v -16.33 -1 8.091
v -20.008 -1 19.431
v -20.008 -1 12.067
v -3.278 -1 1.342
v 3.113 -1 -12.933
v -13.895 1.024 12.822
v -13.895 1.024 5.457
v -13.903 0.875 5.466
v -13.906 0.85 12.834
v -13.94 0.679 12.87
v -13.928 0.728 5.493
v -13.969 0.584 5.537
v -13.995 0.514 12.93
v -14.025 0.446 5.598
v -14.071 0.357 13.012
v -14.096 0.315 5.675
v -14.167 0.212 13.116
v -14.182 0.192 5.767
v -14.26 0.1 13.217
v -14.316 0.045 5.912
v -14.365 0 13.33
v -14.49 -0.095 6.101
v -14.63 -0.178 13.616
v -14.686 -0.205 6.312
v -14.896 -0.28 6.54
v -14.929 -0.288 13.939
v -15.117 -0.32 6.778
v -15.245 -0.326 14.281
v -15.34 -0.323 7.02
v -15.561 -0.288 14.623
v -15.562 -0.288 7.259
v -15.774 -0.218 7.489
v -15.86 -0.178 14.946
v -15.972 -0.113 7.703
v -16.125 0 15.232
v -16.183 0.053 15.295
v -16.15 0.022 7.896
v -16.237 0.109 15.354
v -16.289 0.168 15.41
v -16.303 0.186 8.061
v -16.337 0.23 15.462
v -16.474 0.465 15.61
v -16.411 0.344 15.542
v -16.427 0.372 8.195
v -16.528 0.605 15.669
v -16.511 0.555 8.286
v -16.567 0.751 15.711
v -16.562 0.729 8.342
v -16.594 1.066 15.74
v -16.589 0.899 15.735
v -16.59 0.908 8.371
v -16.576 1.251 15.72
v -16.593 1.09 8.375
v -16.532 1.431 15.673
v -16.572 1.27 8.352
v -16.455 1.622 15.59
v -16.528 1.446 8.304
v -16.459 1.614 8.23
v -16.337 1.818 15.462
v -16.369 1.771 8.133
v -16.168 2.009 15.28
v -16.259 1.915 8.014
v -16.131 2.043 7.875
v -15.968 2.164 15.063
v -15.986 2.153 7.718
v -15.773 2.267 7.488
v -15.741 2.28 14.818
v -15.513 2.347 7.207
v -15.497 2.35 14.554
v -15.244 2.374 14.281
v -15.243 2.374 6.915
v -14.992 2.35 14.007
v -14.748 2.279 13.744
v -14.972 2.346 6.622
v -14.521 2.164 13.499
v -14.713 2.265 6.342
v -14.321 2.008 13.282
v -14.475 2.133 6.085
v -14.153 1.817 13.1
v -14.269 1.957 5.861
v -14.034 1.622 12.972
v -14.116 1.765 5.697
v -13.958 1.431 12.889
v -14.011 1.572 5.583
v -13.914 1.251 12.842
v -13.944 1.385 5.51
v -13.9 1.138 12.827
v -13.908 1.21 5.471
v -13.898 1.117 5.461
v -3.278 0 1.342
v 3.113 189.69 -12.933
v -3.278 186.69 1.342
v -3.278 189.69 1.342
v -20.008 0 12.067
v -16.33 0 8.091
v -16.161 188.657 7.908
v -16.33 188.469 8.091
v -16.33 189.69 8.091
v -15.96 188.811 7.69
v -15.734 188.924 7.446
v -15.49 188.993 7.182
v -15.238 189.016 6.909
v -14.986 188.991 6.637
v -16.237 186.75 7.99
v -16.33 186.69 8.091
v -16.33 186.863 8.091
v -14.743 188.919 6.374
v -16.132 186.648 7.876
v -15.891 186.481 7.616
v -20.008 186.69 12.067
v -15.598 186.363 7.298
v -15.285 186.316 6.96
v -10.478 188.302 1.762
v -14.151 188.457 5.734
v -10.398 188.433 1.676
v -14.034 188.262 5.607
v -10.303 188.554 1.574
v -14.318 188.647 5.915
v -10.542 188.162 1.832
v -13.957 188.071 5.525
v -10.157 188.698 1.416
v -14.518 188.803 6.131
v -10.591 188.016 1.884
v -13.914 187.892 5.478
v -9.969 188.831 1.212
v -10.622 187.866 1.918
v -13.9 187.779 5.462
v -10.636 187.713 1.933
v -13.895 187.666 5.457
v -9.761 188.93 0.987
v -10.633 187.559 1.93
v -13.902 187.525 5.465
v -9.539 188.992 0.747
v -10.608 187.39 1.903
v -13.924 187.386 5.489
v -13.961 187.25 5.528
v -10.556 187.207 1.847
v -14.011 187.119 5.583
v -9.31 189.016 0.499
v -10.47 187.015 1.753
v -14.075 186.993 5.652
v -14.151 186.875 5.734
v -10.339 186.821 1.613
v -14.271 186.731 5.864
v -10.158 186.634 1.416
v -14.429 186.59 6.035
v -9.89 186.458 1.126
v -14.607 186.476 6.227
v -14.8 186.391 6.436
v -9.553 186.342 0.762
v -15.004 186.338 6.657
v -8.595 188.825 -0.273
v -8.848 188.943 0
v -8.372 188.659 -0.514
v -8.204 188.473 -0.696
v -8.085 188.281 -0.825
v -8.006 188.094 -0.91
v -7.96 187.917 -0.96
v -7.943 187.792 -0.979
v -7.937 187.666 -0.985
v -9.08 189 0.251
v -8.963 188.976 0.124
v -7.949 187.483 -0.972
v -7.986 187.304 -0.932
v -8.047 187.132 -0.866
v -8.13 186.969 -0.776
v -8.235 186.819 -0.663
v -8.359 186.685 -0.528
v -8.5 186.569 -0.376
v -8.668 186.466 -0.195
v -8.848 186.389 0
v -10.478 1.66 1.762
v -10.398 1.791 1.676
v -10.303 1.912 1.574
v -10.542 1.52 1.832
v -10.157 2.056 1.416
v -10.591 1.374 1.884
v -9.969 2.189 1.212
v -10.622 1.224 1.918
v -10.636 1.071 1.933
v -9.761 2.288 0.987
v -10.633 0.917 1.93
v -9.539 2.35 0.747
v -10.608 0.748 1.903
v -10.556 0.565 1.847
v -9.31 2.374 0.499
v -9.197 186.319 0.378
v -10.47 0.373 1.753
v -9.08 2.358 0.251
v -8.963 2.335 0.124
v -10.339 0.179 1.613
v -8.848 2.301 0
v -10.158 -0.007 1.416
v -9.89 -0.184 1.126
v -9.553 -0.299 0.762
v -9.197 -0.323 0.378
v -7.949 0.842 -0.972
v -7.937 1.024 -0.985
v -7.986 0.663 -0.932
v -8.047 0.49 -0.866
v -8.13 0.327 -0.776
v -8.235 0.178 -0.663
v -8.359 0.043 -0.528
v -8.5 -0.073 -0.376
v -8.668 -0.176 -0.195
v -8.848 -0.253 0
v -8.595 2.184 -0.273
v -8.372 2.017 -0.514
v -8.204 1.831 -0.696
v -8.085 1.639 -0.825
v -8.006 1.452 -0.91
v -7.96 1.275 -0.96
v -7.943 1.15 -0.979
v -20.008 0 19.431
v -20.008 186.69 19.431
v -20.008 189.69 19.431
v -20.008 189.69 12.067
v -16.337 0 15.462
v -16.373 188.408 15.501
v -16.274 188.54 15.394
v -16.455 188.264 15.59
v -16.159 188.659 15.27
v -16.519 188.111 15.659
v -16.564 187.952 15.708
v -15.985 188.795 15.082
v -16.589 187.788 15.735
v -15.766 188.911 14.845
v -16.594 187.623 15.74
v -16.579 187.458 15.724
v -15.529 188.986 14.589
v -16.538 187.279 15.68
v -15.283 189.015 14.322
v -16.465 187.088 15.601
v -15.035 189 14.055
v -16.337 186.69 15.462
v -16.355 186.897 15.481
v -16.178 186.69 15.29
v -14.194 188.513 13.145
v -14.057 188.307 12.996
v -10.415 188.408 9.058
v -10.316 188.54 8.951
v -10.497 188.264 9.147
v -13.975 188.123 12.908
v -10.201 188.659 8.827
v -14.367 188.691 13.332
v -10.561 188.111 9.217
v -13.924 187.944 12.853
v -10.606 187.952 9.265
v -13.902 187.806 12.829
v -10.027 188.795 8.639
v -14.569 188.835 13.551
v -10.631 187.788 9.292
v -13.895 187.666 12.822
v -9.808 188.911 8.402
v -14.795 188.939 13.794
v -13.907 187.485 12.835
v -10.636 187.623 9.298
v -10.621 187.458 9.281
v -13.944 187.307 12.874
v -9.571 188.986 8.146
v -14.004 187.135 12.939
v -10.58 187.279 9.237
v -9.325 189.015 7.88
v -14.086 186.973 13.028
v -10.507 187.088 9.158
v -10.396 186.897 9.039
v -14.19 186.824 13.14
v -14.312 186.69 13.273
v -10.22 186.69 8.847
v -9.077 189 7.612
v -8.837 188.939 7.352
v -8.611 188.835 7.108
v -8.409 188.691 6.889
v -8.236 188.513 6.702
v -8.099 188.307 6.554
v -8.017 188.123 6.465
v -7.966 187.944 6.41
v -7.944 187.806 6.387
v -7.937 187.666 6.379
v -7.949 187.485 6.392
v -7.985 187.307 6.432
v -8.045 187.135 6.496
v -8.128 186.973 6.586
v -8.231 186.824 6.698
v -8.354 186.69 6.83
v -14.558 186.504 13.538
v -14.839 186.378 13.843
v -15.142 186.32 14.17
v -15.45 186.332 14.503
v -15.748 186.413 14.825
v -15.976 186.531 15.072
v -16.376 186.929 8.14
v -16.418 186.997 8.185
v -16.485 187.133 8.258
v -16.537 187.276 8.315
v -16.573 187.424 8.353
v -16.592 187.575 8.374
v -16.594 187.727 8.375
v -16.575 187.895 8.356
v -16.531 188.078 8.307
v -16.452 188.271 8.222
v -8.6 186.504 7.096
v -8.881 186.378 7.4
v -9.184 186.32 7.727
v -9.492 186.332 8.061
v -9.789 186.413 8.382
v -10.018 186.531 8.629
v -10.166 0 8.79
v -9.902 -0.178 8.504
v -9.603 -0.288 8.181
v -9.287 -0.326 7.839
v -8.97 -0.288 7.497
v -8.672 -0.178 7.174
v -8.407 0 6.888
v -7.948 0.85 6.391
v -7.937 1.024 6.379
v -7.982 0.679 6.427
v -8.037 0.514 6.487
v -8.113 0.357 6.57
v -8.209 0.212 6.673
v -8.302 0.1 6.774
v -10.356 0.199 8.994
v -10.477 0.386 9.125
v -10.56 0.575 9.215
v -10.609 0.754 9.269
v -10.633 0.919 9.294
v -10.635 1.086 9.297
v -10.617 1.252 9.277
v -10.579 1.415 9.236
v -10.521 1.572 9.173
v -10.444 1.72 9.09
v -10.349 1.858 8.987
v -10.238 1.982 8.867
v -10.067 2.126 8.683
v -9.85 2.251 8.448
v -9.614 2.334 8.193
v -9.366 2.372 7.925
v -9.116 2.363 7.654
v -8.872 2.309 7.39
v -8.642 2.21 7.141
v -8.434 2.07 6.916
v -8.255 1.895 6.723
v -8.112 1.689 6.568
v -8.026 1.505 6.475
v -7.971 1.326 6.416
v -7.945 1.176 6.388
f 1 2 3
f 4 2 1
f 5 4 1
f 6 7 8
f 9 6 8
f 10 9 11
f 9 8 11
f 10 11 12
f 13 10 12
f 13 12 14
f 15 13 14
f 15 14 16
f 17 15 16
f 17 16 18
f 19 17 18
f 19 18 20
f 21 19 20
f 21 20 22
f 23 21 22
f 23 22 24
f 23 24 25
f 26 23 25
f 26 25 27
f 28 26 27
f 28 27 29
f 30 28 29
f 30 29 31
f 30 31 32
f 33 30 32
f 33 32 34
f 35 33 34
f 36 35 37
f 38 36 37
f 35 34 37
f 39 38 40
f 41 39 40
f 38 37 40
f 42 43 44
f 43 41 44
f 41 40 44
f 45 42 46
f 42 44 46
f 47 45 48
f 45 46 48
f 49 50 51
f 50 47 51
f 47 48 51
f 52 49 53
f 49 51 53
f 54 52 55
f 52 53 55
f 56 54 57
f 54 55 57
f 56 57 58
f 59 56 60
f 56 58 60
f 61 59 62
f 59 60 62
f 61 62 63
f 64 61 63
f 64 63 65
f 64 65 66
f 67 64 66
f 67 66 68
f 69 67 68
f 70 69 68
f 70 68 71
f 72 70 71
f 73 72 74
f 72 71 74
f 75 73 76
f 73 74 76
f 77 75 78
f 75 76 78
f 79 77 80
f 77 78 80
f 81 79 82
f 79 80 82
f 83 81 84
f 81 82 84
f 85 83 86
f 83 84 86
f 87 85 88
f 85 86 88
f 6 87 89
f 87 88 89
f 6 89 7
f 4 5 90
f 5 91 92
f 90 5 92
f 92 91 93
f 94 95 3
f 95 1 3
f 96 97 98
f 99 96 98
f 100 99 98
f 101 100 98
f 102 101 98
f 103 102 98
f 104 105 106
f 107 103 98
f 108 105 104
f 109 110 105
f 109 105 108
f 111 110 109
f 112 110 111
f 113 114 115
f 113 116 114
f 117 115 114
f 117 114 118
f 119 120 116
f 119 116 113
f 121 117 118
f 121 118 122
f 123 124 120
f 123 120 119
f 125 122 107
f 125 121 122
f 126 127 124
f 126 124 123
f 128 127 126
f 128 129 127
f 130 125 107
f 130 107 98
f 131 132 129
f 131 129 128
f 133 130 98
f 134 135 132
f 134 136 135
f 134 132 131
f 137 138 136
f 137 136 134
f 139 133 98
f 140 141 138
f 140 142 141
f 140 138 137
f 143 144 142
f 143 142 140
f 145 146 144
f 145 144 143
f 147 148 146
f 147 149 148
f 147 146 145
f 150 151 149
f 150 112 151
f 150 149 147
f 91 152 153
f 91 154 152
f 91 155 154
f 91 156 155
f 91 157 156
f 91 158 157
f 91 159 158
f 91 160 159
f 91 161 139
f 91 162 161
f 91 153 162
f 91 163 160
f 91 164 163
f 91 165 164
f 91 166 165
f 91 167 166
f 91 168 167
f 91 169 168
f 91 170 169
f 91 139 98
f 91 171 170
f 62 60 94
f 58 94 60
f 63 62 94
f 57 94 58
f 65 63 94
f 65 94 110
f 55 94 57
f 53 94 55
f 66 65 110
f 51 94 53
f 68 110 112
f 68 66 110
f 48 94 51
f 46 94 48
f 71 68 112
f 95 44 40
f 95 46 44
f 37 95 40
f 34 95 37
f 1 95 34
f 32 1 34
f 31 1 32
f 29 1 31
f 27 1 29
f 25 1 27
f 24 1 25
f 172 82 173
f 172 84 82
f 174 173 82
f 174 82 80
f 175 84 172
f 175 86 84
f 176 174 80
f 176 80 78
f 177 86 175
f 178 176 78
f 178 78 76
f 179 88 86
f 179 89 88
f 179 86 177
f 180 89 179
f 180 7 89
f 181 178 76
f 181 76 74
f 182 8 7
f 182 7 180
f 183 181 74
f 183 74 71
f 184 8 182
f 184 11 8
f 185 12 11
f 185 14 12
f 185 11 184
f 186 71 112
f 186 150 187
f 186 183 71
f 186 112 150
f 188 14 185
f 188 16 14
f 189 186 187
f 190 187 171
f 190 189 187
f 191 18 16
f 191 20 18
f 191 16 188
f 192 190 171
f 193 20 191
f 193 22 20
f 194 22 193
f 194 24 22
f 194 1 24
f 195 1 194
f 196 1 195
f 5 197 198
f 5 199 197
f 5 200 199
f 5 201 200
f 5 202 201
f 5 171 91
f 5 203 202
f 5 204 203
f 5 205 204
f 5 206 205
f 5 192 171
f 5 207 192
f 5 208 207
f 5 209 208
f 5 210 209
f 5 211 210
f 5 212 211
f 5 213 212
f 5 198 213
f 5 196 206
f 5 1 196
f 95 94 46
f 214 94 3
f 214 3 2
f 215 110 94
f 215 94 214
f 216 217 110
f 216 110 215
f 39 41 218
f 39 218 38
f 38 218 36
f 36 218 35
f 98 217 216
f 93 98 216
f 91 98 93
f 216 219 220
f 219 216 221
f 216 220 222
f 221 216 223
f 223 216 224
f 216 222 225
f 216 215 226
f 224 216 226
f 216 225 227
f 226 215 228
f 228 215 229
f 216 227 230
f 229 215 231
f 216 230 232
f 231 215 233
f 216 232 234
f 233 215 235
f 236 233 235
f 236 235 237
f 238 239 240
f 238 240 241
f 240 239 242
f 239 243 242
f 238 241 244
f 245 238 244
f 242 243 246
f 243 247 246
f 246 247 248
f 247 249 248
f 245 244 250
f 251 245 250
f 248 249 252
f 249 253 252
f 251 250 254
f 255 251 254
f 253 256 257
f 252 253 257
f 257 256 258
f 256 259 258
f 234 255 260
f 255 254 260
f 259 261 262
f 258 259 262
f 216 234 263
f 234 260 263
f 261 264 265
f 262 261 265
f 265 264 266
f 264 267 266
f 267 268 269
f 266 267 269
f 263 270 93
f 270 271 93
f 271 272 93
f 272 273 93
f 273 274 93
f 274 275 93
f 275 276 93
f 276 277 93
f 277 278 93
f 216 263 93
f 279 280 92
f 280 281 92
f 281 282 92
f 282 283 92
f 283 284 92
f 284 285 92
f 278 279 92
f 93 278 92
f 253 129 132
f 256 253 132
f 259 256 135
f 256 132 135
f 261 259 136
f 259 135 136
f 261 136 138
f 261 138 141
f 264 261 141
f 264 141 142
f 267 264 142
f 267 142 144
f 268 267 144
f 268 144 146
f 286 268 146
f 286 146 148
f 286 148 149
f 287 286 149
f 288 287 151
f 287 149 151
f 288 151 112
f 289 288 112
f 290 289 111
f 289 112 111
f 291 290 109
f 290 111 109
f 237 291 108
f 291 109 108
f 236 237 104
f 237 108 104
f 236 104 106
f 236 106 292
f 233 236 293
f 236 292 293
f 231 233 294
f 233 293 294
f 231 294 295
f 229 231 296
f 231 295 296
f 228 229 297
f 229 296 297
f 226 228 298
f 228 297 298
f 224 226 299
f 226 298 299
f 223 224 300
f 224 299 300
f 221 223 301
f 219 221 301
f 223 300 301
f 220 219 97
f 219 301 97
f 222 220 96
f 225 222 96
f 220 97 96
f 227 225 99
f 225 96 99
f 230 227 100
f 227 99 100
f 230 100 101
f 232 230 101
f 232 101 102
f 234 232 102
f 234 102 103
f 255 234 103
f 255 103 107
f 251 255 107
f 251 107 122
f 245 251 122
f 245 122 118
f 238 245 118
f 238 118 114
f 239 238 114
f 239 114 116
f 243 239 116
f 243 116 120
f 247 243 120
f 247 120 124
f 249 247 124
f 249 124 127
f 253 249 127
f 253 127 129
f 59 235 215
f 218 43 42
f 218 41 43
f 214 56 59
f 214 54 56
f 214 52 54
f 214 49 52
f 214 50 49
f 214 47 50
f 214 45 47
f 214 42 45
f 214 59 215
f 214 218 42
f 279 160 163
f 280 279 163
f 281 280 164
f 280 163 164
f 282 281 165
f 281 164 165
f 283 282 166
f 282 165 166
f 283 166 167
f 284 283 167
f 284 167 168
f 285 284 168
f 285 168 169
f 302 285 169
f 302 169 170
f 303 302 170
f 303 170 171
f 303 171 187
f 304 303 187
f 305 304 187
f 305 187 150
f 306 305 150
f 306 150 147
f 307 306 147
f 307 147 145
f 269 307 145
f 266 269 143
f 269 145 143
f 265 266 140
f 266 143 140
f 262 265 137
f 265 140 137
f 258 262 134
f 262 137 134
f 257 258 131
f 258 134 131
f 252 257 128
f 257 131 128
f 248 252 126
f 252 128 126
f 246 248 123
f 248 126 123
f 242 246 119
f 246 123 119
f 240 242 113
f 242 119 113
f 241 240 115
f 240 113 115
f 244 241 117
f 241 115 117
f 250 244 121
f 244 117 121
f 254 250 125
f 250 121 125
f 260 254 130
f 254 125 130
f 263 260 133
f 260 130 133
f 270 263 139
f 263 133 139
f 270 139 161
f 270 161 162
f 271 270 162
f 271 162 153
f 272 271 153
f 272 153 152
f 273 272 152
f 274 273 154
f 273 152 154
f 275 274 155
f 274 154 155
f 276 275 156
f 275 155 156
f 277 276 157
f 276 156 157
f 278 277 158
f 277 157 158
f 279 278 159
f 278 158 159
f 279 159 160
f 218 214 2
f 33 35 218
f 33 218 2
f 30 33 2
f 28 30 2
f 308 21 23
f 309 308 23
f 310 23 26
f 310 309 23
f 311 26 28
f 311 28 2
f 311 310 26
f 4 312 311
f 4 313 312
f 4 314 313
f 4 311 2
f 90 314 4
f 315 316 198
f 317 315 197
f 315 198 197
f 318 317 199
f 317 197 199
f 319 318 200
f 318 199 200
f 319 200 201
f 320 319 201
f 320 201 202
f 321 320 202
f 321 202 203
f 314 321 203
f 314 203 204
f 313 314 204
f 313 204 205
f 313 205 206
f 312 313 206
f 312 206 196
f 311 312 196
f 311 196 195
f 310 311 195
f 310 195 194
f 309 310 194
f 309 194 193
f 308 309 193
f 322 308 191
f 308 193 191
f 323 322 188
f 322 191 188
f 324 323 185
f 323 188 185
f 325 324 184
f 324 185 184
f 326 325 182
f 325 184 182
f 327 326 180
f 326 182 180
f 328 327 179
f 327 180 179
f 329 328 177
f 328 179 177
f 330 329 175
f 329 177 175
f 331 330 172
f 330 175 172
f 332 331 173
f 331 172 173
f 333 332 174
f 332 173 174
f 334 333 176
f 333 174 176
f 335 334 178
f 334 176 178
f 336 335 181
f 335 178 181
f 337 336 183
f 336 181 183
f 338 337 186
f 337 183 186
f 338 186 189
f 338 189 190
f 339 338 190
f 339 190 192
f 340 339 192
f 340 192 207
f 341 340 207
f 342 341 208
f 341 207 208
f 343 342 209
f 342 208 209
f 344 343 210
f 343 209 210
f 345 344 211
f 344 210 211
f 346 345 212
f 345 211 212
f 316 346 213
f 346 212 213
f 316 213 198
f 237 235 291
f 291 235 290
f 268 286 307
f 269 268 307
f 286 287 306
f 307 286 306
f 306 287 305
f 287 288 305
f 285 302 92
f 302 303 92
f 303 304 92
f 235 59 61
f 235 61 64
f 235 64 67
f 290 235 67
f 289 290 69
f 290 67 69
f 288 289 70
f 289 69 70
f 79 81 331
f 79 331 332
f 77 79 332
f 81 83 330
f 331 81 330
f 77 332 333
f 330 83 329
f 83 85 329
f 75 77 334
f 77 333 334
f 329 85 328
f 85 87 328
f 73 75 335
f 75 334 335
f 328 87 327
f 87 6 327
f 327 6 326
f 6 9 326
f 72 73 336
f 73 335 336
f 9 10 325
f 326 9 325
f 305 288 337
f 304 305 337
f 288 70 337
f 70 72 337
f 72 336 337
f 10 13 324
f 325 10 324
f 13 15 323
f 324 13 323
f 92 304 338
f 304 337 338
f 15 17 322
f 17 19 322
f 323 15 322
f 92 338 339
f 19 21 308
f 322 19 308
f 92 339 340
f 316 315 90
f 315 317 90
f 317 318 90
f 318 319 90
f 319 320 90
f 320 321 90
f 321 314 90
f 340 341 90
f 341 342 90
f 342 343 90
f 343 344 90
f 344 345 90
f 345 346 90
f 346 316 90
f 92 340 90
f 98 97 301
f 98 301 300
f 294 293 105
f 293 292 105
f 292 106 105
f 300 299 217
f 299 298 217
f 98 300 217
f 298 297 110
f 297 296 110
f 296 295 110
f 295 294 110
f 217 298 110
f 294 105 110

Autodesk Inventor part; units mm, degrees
ref_plane "YZ Plane" through (0, 0, 0) normal (1, 0, 0) x (0, 1, 0)
ref_plane "XZ Plane" through (0, 0, 0) normal (0, 1, 0) x (-1, 0, 0)
ref_plane "XY Plane" through (0, 0, 0) normal (0, 0, 1) x (1, 0, 0)
sketch "Sketch1" plane through (0, 0, 0) normal (0, 1, 0) x (-1, 0, 0)
  line L0 (20.0075, 12.0668) -> (-3.1128, -12.9332)
  line L1 (-3.1128, -12.9332) -> (20.0075, 12.0668)
  line L2 (-3.1128, -17.9332) -> (-3.1128, -12.9332)
  line L3 (-3.1128, -17.9332) -> (-14.7232, -17.9332)
  line L4 (-3.1128, -17.9332) -> (-3.1128, -12.9332)
  line L5 (-3.1128, -17.9332) -> (-8.918, -17.9332)
  arc A0 (-14.7232, -17.9332) -> (-3.1128, -12.9332) centre (-21.6099, 14.0384) ccw
  line L6 (-14.7232, -17.9332) -> (20.7671, -17.9332)
  line L7 (20.0075, 12.0668) -> (20.0075, -17.9332)
  line L8 (20.0075, 12.0668) -> (20.0075, 17.0668)
  line L9 (16.3366, 15.4617) -> (-8.1128, -10.9755)
  line L10 (16.3366, 15.4617) -> (20.0075, 19.431)
  line L11 (20.0075, 19.431) -> (20.0075, 15.7489)
  line L12 (-14.7232, -17.9332) -> (-8.1128, -10.9755)
  point P0 (0, 0)
  dimension "d0" = 5
  dimension "d1" = 5
extrude "Extrusion1" add sketch "Sketch1" along normal blind 186.69 contours L0 A0 L12 L9 L10 L11 L8
sketch "Sketch2" plane through (0, 0, 0) normal (0, -1, 0) x (1, 0, 0)
  line L0 (3.1128, -12.9332) -> (-20.0075, 12.0668) projected
  line L1 (-20.0075, 12.0668) -> (-16.3304, 12.0668)
  line L2 (-16.3304, 12.0668) -> (-16.3304, -0.4332)
  line L3 (-16.3304, -0.4332) -> (-20.0075, -0.4332)
  line L4 (-20.0075, -0.4332) -> (-20.0075, 12.0668)
  circle A0 centre (-18.1689, 1.5735) radius 1.35
  circle A1 centre (-18.1689, 5.8168) radius 1.35
  point P0 (0, 0)
  point P1 (-16.3304, 8.0908)
  dimension "d4" = 2.7
  dimension "d5" = 2.7
extrude "Extrusion2" add sketch "Sketch2" along normal blind 3 contours L2 L3 L4 L0
sketch "Sketch3" plane through (0, 0, 0) normal (0, -1, 0) x (1, 0, 0)
  line L0 (-20.0075, 12.0668) -> (-20.0075, 19.431) projected
  line L1 (3.1128, -12.9332) -> (-20.0075, 12.0668) projected
  line L2 (-20.0075, 19.431) -> (-20.0075, 12.0668)
  line L3 (-20.0075, 12.0668) -> (3.1128, -12.9332)
  arc A0 (3.1128, -12.9332) -> (14.7232, -17.9332) centre (21.6099, 14.0384) ccw projected
  arc A1 (3.1128, -12.9332) -> (14.6054, -17.9076) centre (21.6099, 14.0384) ccw
  line L4 (8.1128, -10.9755) -> (14.7232, -17.9332) projected
  line L5 (8.1128, -10.9755) -> (14.7232, -17.9332)
  line L6 (-20.0075, 19.431) -> (8.1128, -10.9755)
  point P0 (0, 0)
extrude "Extrusion3" add sketch "Sketch3" along normal blind 3
sketch "Sketch4" plane through (0, 186.69, 0) normal (0, 1, 0) x (1, 0, 0)
  circle A0 centre (-18.1689, -5.8168) radius 1.35 projected
  circle A1 centre (-18.1689, -1.5735) radius 1.35 projected
  line L0 (-20.0075, -19.431) -> (-20.0075, 0.4332) projected
  line L1 (-20.0075, 0.4332) -> (-16.3304, 0.4332) projected
  line L2 (-16.3304, 0.4332) -> (-16.3304, -8.0908) projected
  line L3 (8.1128, 10.9755) -> (14.7232, 17.9332) projected
  line L4 (14.7232, 17.9332) -> (8.1128, 10.9755)
  line L5 (-20.0075, -19.431) -> (8.1128, 10.9755) projected
  line L6 (8.1128, 10.9755) -> (-20.0075, -19.431)
  line L7 (-20.0075, -19.431) -> (-20.0075, 0.4332)
  line L8 (-20.0075, 0.4332) -> (-16.3304, 0.4332) projected
  line L9 (-20.0075, 0.4332) -> (-16.3304, 0.4332)
  line L10 (-16.3304, 0.4332) -> (-16.3304, -8.0908)
  line L11 (3.1128, 12.9332) -> (-20.0075, -12.0668) projected
  line L12 (-16.3304, -8.0908) -> (3.1128, 12.9332)
  arc A2 (14.7232, 17.9332) -> (3.1128, 12.9332) centre (21.6099, -14.0384) ccw
  arc A3 (-20.0075, -12.0668) -> (-20.0075, -10.5639) centre (-20.8201, -11.3154) ccw
  line L13 (-16.3304, 0.4332) -> (-20.0075, 0.4332)
  point P0 (0, 0)
extrude "Extrusion4" add sketch "Sketch4" along normal blind 3
sketch "Sketch5" plane through (0, 189.69, 0) normal (0, 1, 0) x (1, 0, 0)
  line L0 (-16.3304, -8.0908) -> (3.1128, 12.9332) projected
  line L1 (3.1128, 12.9332) -> (3.1128, 4.2571)
  line L2 (3.1128, 4.2571) -> (16.783, 4.2571)
  line L3 (16.783, 4.2571) -> (16.783, 22.684)
  line L4 (16.783, 22.684) -> (3.1128, 22.684)
  line L5 (3.1128, 22.684) -> (3.1128, 12.9332)
  point P0 (0, 0)
extrude "Extrusion5" cut sketch "Sketch5" against normal blind 200
sketch "Sketch6" plane through (0, 189.69, 0) normal (0, 1, 0) x (1, 0, 0)
  line L0 (3.1128, 12.9332) -> (-16.3304, -8.0908) projected
  line L1 (3.1128, 12.9332) -> (-3.2785, -1.3419)
  line L2 (-20.0075, -19.431) -> (3.1128, 5.569) projected
  line L3 (3.1128, 5.569) -> (3.1128, 12.9332) projected
  line L4 (3.1128, 5.569) -> (-3.2785, -1.3419)
  line L5 (3.1128, 5.569) -> (3.1128, 12.9332)
  point P0 (0, 0)
extrude "Extrusion6" cut sketch "Sketch6" against normal blind 200
sketch "Sketch7" plane through (0, -3, 0) normal (0, -1, 0) x (1, 0, 0)
  line L0 (-16.3304, 8.0908) -> (-16.3304, -0.4332) projected
  line L1 (-16.3304, 8.0908) -> (-20.0075, 12.0668) projected
  line L2 (-16.3304, 8.0908) -> (-20.0075, 12.0668)
  line L3 (-20.0075, -0.4332) -> (-20.0075, 19.431) projected
  line L4 (-20.0075, 12.0668) -> (-20.0075, -0.4332)
  line L5 (-16.3304, -0.4332) -> (-20.0075, -0.4332) projected
  line L6 (-20.0075, -0.4332) -> (-16.3304, -0.4332)
  line L7 (-16.3304, -0.4332) -> (-16.3304, 8.0908)
  point P0 (0, 0)
extrude "Extrusion7" cut sketch "Sketch7" against normal blind 222
sketch "Sketch8" plane through (-20.0075, -3, 19.431) normal (0.7341688, 0, 0.678967) x (0.678967, 0, -0.7341688)
  line L0 (0, 0) -> (0, 192.69) projected
  line L1 (0, 192.69) -> (0, 2)
  line L2 (0, 2) -> (41.2163, 2)
  line L3 (41.2163, 2) -> (41.2163, -1.239)
  line L4 (41.2163, -1.239) -> (0, -1.239)
  line L5 (0, -1.239) -> (0, 2)
  point P0 (27.85, 3)
  dimension "d18" = 190.69
extrude "Extrusion8" cut sketch "Sketch8" against normal blind 222
sketch "Sketch9" plane through (0, 0, 0) normal (0, 0, 1) x (1, 0, 0)
  circle A0 centre (-15.245, 1.0241) radius 1.35
  line L0 (-20.0075, -1) -> (-20.0075, 189.69) projected
  line L1 (-20.0075, 94.345) -> (7.4426, 94.345)
  circle A1 centre (-9.2868, 1.0241) radius 1.35
  circle A2 centre (-15.245, 187.6659) radius 1.35
  circle A3 centre (-9.2868, 187.6659) radius 1.35
  point P0 (0, 0)
  dimension "d21" = 2.7
  dimension "d22" = 2.7
extrude "Extrusion9" cut sketch "Sketch9" along normal mid plane 222
sketch "Sketch10" plane through (0, 0, 0) normal (0, 0, 1) x (1, 0, 0)
  circle A0 centre (-15.245, 1.0241) radius 1.35 projected
  circle A1 centre (-15.245, 1.0241) radius 1.35
  circle A2 centre (-9.2868, 1.0241) radius 1.35 projected
  circle A3 centre (-9.2868, 1.0241) radius 1.35
  circle A4 centre (-15.245, 187.6659) radius 1.35 projected
  circle A5 centre (-15.245, 187.6659) radius 1.35
  circle A6 centre (-9.2868, 187.6659) radius 1.35 projected
  circle A7 centre (-9.2868, 187.6659) radius 1.35
  line L0 (-16.595, 1.0241) -> (-20.0075, 1.0241)
  line L1 (-20.0075, -1) -> (-20.0075, 189.69) projected
  line L2 (-20.0075, 1.0241) -> (-20.0075, -1)
  line L3 (-20.0075, -1) -> (-3.2785, -1) projected
  line L4 (-20.0075, -1) -> (-3.2785, -1)
  point P0 (0, 0)
properties part number "blade"
